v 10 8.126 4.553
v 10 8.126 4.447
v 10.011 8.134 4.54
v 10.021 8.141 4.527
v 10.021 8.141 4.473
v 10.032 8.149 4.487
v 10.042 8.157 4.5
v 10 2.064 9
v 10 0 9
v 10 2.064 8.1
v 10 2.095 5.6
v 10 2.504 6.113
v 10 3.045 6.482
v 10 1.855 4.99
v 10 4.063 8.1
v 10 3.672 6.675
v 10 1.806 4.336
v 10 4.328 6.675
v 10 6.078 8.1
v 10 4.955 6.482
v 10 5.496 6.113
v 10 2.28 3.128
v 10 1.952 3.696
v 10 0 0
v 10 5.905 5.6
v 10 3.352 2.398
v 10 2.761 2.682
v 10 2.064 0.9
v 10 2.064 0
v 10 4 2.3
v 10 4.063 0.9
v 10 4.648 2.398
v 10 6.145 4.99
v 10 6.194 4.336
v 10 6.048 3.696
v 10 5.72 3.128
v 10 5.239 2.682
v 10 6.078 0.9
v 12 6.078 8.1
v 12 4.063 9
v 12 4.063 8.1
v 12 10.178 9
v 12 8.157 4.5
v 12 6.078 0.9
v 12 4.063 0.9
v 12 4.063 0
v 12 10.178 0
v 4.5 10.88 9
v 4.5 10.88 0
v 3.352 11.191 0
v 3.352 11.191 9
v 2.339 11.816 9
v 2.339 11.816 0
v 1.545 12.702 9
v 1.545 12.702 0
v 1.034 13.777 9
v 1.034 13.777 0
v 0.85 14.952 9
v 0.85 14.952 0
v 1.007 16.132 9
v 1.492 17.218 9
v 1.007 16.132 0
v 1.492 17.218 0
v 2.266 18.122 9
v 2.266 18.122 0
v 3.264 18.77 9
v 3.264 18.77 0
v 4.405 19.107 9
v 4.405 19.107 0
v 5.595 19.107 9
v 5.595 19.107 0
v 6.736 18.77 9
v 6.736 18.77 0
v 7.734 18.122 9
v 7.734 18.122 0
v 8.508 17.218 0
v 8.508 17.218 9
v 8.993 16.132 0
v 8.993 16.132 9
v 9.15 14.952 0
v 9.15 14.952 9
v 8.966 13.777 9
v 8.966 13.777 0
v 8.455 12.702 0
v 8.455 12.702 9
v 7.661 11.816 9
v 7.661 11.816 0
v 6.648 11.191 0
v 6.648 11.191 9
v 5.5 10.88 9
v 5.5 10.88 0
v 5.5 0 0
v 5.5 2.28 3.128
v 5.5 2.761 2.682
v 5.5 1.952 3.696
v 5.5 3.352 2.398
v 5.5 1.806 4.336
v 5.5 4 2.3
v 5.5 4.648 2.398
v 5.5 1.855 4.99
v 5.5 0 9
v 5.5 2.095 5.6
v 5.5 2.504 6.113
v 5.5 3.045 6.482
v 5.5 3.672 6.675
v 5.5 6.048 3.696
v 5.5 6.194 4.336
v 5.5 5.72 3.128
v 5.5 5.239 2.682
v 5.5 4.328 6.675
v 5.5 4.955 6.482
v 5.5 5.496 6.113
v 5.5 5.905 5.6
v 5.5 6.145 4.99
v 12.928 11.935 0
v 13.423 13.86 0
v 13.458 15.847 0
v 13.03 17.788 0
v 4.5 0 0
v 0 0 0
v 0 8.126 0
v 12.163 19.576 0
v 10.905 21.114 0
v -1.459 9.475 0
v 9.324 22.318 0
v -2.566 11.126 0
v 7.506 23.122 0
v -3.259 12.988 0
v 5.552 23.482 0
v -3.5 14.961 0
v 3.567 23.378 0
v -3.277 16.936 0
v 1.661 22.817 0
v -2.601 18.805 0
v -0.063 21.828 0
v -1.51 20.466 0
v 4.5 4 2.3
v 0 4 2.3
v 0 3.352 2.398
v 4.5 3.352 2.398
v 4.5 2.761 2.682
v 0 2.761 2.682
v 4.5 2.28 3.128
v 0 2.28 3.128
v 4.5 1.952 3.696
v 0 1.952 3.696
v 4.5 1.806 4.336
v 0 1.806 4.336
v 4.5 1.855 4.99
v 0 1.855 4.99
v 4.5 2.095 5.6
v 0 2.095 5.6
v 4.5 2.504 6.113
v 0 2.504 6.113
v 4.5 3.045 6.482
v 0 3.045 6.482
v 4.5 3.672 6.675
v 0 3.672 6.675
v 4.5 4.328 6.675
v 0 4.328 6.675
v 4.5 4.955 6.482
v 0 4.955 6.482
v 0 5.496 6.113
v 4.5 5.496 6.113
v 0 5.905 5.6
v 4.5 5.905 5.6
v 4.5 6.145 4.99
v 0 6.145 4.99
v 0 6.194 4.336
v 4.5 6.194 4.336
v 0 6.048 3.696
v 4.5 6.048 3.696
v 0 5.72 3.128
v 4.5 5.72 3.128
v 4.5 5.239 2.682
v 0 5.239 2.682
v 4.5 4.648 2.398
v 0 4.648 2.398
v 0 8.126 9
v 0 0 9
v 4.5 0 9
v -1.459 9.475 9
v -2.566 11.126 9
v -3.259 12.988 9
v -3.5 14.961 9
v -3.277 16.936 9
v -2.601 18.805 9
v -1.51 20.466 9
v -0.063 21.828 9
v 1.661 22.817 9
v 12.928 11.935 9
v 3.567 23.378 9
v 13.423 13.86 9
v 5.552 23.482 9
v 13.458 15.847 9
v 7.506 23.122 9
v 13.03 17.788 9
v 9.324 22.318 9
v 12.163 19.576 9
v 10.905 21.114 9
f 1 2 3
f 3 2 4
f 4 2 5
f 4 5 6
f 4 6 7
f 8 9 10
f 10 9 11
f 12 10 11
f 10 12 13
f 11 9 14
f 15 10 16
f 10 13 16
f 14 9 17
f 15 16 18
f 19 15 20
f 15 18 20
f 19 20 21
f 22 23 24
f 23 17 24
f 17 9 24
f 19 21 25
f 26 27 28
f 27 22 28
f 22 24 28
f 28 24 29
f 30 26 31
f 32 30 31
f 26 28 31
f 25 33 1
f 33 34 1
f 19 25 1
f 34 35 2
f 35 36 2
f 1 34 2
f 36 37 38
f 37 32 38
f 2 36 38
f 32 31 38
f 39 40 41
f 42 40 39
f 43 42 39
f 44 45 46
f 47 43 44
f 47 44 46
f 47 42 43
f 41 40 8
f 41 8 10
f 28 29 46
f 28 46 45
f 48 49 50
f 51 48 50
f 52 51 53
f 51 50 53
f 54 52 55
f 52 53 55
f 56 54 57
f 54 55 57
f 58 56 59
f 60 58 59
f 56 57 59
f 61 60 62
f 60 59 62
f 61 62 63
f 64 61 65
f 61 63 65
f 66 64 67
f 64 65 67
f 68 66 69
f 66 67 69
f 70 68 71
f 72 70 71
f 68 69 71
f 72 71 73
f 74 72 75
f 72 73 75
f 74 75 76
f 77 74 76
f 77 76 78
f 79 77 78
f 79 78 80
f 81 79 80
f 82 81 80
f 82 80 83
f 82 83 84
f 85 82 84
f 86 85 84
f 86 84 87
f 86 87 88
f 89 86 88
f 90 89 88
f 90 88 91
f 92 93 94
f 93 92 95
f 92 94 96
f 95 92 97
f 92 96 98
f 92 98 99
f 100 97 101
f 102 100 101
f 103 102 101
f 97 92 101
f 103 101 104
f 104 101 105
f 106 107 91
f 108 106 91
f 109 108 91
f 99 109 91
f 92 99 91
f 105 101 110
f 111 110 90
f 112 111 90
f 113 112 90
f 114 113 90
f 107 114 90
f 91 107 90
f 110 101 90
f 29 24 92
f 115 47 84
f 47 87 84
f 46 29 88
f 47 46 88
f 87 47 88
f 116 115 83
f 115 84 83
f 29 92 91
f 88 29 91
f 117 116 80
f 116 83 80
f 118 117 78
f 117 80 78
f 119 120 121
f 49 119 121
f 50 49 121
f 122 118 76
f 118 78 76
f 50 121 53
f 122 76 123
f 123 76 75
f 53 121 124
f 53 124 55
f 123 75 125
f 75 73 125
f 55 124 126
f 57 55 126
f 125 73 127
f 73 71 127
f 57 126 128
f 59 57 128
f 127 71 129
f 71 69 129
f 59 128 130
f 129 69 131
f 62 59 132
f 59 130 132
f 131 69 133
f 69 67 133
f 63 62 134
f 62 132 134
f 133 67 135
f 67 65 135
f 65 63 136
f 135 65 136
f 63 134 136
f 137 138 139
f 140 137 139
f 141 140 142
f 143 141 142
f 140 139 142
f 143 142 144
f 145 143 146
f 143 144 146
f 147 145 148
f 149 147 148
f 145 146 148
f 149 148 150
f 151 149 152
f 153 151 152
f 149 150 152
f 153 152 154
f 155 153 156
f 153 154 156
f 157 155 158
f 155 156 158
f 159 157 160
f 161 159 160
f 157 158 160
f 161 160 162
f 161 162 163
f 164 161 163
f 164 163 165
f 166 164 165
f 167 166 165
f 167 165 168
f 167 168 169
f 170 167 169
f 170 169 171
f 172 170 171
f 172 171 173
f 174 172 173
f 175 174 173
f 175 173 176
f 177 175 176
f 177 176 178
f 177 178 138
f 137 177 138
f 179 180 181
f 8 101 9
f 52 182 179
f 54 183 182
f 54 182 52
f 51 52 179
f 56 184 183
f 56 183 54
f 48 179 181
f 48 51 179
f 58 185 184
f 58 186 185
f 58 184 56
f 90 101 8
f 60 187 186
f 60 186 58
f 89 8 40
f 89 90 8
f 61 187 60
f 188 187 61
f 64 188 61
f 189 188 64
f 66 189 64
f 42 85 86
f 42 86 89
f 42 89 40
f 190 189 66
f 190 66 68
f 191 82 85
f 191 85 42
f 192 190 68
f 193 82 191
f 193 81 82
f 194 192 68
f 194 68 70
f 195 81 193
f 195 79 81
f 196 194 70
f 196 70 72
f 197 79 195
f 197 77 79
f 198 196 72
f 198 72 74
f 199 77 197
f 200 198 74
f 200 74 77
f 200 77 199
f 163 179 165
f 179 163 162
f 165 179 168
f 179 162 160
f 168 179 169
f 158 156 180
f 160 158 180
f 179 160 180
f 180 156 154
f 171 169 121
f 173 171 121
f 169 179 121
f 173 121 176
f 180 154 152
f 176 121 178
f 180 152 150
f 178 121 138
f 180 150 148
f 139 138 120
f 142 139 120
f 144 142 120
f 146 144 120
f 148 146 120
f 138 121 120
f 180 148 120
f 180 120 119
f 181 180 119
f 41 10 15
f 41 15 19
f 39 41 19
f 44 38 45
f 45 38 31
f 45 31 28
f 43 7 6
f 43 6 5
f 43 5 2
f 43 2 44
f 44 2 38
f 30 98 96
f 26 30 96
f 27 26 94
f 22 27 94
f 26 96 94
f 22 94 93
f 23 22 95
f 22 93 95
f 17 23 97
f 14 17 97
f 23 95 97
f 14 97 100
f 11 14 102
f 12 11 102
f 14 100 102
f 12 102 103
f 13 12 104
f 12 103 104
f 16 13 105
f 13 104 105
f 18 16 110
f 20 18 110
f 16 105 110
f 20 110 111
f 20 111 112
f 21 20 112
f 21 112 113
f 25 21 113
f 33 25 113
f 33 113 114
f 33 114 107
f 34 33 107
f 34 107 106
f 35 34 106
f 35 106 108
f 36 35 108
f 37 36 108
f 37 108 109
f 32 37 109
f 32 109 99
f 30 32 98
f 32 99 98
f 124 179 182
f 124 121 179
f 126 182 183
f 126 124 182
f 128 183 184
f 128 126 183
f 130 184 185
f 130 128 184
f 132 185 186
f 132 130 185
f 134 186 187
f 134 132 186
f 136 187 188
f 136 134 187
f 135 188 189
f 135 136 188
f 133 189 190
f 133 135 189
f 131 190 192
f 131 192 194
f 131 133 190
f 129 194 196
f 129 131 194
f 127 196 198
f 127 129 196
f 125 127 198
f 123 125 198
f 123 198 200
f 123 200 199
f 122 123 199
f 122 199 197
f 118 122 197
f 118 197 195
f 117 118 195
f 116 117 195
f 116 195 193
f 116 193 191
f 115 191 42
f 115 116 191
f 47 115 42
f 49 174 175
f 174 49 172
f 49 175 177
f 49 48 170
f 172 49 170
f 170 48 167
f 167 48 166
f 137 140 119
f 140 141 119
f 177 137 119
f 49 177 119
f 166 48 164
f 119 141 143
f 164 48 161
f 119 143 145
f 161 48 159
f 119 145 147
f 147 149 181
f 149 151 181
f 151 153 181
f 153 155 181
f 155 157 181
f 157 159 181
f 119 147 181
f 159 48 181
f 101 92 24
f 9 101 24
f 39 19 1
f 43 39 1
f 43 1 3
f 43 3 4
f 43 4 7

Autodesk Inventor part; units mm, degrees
ref_plane "YZ Plane" through (0, 0, 0) normal (1, 0, 0) x (0, 1, 0)
ref_plane "XZ Plane" through (0, 0, 0) normal (0, 1, 0) x (-1, 0, 0)
ref_plane "XY Plane" through (0, 0, 0) normal (0, 0, 1) x (1, 0, 0)
sketch "スケッチ1" plane through (0, 0, 0) normal (0, 0, 1) x (1, 0, 0)
  line L0 (0, 0) -> (10, 0)
  line L1 (10, 0) -> (10, 15)
  line L2 (10, 15) -> (0, 15)
  line L3 (0, 15) -> (0, 0)
  circle A0 centre (5, 15) radius 8.5
  point P0 (0, 8.1261)
  point P1 (10, 8.1261)
  dimension "d0" = 15
  dimension "d1" = 17
  dimension "d27" = 10
  dimension "d28" = 5
extrude "押し出し1" add sketch "スケッチ1" along normal blind 9
sketch "スケッチ2" plane through (0, 0, 9) normal (0, 0, 1) x (1, 0, 0)
  arc A0 (10, 8.1261) -> (0, 8.1261) centre (5, 15) ccw projected
  point P0 (0, 0)
hole "穴1" at (5, 15, 9) direction (0, 0, -1) diameter 8.3 end through all
sketch "スケッチ3" plane through (0, 0, 9) normal (0, 0, 1) x (1, 0, 0)
  line L0 (0, 0) -> (10, 0) projected
  line L1 (4.5, 0) -> (5.5, 0)
  line L2 (5.5, 0) -> (5.5, 15)
  line L3 (5.5, 15) -> (4.5, 15)
  line L4 (4.5, 15) -> (4.5, 0)
  line L5 (0, 8.1261) -> (0, 0) projected
  circle A0 centre (5, 15) radius 4.15 projected
  point P0 (5, 0)
  point P1 (5, 0)
  dimension "d14" = 1
extrude "押し出し2" cut sketch "スケッチ3" against normal up to surface (9 mm away) contours L4 A0 L2 L0 | L4 L3 L2 A0 picked at (4.9443, 13.6178)
sketch "スケッチ4" plane through (10, 0, 0) normal (1, 0, 0) x (0, 0, -1)
  circle A0 centre (-4.5, 4) radius 1.5
  line L0 (0, 0) -> (-9, 0) projected
  line L1 (0, 0) -> (0, 8.1261) projected
  line L2 (-4.5, 0) -> (-4.5, 10)
  point P0 (0, 10)
  dimension "d17" = 4
  dimension "d19" = 3
hole "穴2" at (10, 4, 4.5) direction (-1, 0, 0) diameter 4.4 end through all
sketch "スケッチ7" plane through (10, 0, 0) normal (1, 0, 0) x (0, 0, -1)
  circle A0 centre (-4.5, 4) radius 2.2 projected
  line L0 (-4.5, 8.1569) -> (-0.9, 6.0785)
  line L1 (-0.9, 6.0785) -> (-0.9, 1.9215)
  line L2 (-0.9, 1.9215) -> (-4.5, -0.1569)
  line L3 (-4.5, -0.1569) -> (-8.1, 1.9215)
  line L4 (-8.1, 1.9215) -> (-8.1, 6.0785)
  line L5 (-8.1, 6.0785) -> (-4.5, 8.1569)
  line L6 (-9, 10.8802) -> (-9, 0) projected
  line L7 (0, 0) -> (0, 8.1261) projected
  line L8 (-9, 10.8802) -> (0, 10.8802)
  line L9 (0, 10.8802) -> (0, 4.0631)
  line L10 (0, 4.0631) -> (-9, 4.0631)
  line L11 (-9, 4.0631) -> (-9, 10.8802)
  point P0 (-4.5, 4)
  point P1 (-0.9, 4.0631)
  point P2 (-8.1, 4.0631)
  dimension "d35" = 7.2
extrude "押し出し5" add sketch "スケッチ7" along normal blind 2 contours L1 L0 L5 L4 L10 L6 L8 L9 L7
chamfer "面取り1" distance 2 angle 45 2 edges at (10, 4.0631, 8.55) (10, 4.0631, 0.45)
equation "\"d28\" = 0.5 * d27"
properties part number "軸止め" material "ABS プラスチック"
